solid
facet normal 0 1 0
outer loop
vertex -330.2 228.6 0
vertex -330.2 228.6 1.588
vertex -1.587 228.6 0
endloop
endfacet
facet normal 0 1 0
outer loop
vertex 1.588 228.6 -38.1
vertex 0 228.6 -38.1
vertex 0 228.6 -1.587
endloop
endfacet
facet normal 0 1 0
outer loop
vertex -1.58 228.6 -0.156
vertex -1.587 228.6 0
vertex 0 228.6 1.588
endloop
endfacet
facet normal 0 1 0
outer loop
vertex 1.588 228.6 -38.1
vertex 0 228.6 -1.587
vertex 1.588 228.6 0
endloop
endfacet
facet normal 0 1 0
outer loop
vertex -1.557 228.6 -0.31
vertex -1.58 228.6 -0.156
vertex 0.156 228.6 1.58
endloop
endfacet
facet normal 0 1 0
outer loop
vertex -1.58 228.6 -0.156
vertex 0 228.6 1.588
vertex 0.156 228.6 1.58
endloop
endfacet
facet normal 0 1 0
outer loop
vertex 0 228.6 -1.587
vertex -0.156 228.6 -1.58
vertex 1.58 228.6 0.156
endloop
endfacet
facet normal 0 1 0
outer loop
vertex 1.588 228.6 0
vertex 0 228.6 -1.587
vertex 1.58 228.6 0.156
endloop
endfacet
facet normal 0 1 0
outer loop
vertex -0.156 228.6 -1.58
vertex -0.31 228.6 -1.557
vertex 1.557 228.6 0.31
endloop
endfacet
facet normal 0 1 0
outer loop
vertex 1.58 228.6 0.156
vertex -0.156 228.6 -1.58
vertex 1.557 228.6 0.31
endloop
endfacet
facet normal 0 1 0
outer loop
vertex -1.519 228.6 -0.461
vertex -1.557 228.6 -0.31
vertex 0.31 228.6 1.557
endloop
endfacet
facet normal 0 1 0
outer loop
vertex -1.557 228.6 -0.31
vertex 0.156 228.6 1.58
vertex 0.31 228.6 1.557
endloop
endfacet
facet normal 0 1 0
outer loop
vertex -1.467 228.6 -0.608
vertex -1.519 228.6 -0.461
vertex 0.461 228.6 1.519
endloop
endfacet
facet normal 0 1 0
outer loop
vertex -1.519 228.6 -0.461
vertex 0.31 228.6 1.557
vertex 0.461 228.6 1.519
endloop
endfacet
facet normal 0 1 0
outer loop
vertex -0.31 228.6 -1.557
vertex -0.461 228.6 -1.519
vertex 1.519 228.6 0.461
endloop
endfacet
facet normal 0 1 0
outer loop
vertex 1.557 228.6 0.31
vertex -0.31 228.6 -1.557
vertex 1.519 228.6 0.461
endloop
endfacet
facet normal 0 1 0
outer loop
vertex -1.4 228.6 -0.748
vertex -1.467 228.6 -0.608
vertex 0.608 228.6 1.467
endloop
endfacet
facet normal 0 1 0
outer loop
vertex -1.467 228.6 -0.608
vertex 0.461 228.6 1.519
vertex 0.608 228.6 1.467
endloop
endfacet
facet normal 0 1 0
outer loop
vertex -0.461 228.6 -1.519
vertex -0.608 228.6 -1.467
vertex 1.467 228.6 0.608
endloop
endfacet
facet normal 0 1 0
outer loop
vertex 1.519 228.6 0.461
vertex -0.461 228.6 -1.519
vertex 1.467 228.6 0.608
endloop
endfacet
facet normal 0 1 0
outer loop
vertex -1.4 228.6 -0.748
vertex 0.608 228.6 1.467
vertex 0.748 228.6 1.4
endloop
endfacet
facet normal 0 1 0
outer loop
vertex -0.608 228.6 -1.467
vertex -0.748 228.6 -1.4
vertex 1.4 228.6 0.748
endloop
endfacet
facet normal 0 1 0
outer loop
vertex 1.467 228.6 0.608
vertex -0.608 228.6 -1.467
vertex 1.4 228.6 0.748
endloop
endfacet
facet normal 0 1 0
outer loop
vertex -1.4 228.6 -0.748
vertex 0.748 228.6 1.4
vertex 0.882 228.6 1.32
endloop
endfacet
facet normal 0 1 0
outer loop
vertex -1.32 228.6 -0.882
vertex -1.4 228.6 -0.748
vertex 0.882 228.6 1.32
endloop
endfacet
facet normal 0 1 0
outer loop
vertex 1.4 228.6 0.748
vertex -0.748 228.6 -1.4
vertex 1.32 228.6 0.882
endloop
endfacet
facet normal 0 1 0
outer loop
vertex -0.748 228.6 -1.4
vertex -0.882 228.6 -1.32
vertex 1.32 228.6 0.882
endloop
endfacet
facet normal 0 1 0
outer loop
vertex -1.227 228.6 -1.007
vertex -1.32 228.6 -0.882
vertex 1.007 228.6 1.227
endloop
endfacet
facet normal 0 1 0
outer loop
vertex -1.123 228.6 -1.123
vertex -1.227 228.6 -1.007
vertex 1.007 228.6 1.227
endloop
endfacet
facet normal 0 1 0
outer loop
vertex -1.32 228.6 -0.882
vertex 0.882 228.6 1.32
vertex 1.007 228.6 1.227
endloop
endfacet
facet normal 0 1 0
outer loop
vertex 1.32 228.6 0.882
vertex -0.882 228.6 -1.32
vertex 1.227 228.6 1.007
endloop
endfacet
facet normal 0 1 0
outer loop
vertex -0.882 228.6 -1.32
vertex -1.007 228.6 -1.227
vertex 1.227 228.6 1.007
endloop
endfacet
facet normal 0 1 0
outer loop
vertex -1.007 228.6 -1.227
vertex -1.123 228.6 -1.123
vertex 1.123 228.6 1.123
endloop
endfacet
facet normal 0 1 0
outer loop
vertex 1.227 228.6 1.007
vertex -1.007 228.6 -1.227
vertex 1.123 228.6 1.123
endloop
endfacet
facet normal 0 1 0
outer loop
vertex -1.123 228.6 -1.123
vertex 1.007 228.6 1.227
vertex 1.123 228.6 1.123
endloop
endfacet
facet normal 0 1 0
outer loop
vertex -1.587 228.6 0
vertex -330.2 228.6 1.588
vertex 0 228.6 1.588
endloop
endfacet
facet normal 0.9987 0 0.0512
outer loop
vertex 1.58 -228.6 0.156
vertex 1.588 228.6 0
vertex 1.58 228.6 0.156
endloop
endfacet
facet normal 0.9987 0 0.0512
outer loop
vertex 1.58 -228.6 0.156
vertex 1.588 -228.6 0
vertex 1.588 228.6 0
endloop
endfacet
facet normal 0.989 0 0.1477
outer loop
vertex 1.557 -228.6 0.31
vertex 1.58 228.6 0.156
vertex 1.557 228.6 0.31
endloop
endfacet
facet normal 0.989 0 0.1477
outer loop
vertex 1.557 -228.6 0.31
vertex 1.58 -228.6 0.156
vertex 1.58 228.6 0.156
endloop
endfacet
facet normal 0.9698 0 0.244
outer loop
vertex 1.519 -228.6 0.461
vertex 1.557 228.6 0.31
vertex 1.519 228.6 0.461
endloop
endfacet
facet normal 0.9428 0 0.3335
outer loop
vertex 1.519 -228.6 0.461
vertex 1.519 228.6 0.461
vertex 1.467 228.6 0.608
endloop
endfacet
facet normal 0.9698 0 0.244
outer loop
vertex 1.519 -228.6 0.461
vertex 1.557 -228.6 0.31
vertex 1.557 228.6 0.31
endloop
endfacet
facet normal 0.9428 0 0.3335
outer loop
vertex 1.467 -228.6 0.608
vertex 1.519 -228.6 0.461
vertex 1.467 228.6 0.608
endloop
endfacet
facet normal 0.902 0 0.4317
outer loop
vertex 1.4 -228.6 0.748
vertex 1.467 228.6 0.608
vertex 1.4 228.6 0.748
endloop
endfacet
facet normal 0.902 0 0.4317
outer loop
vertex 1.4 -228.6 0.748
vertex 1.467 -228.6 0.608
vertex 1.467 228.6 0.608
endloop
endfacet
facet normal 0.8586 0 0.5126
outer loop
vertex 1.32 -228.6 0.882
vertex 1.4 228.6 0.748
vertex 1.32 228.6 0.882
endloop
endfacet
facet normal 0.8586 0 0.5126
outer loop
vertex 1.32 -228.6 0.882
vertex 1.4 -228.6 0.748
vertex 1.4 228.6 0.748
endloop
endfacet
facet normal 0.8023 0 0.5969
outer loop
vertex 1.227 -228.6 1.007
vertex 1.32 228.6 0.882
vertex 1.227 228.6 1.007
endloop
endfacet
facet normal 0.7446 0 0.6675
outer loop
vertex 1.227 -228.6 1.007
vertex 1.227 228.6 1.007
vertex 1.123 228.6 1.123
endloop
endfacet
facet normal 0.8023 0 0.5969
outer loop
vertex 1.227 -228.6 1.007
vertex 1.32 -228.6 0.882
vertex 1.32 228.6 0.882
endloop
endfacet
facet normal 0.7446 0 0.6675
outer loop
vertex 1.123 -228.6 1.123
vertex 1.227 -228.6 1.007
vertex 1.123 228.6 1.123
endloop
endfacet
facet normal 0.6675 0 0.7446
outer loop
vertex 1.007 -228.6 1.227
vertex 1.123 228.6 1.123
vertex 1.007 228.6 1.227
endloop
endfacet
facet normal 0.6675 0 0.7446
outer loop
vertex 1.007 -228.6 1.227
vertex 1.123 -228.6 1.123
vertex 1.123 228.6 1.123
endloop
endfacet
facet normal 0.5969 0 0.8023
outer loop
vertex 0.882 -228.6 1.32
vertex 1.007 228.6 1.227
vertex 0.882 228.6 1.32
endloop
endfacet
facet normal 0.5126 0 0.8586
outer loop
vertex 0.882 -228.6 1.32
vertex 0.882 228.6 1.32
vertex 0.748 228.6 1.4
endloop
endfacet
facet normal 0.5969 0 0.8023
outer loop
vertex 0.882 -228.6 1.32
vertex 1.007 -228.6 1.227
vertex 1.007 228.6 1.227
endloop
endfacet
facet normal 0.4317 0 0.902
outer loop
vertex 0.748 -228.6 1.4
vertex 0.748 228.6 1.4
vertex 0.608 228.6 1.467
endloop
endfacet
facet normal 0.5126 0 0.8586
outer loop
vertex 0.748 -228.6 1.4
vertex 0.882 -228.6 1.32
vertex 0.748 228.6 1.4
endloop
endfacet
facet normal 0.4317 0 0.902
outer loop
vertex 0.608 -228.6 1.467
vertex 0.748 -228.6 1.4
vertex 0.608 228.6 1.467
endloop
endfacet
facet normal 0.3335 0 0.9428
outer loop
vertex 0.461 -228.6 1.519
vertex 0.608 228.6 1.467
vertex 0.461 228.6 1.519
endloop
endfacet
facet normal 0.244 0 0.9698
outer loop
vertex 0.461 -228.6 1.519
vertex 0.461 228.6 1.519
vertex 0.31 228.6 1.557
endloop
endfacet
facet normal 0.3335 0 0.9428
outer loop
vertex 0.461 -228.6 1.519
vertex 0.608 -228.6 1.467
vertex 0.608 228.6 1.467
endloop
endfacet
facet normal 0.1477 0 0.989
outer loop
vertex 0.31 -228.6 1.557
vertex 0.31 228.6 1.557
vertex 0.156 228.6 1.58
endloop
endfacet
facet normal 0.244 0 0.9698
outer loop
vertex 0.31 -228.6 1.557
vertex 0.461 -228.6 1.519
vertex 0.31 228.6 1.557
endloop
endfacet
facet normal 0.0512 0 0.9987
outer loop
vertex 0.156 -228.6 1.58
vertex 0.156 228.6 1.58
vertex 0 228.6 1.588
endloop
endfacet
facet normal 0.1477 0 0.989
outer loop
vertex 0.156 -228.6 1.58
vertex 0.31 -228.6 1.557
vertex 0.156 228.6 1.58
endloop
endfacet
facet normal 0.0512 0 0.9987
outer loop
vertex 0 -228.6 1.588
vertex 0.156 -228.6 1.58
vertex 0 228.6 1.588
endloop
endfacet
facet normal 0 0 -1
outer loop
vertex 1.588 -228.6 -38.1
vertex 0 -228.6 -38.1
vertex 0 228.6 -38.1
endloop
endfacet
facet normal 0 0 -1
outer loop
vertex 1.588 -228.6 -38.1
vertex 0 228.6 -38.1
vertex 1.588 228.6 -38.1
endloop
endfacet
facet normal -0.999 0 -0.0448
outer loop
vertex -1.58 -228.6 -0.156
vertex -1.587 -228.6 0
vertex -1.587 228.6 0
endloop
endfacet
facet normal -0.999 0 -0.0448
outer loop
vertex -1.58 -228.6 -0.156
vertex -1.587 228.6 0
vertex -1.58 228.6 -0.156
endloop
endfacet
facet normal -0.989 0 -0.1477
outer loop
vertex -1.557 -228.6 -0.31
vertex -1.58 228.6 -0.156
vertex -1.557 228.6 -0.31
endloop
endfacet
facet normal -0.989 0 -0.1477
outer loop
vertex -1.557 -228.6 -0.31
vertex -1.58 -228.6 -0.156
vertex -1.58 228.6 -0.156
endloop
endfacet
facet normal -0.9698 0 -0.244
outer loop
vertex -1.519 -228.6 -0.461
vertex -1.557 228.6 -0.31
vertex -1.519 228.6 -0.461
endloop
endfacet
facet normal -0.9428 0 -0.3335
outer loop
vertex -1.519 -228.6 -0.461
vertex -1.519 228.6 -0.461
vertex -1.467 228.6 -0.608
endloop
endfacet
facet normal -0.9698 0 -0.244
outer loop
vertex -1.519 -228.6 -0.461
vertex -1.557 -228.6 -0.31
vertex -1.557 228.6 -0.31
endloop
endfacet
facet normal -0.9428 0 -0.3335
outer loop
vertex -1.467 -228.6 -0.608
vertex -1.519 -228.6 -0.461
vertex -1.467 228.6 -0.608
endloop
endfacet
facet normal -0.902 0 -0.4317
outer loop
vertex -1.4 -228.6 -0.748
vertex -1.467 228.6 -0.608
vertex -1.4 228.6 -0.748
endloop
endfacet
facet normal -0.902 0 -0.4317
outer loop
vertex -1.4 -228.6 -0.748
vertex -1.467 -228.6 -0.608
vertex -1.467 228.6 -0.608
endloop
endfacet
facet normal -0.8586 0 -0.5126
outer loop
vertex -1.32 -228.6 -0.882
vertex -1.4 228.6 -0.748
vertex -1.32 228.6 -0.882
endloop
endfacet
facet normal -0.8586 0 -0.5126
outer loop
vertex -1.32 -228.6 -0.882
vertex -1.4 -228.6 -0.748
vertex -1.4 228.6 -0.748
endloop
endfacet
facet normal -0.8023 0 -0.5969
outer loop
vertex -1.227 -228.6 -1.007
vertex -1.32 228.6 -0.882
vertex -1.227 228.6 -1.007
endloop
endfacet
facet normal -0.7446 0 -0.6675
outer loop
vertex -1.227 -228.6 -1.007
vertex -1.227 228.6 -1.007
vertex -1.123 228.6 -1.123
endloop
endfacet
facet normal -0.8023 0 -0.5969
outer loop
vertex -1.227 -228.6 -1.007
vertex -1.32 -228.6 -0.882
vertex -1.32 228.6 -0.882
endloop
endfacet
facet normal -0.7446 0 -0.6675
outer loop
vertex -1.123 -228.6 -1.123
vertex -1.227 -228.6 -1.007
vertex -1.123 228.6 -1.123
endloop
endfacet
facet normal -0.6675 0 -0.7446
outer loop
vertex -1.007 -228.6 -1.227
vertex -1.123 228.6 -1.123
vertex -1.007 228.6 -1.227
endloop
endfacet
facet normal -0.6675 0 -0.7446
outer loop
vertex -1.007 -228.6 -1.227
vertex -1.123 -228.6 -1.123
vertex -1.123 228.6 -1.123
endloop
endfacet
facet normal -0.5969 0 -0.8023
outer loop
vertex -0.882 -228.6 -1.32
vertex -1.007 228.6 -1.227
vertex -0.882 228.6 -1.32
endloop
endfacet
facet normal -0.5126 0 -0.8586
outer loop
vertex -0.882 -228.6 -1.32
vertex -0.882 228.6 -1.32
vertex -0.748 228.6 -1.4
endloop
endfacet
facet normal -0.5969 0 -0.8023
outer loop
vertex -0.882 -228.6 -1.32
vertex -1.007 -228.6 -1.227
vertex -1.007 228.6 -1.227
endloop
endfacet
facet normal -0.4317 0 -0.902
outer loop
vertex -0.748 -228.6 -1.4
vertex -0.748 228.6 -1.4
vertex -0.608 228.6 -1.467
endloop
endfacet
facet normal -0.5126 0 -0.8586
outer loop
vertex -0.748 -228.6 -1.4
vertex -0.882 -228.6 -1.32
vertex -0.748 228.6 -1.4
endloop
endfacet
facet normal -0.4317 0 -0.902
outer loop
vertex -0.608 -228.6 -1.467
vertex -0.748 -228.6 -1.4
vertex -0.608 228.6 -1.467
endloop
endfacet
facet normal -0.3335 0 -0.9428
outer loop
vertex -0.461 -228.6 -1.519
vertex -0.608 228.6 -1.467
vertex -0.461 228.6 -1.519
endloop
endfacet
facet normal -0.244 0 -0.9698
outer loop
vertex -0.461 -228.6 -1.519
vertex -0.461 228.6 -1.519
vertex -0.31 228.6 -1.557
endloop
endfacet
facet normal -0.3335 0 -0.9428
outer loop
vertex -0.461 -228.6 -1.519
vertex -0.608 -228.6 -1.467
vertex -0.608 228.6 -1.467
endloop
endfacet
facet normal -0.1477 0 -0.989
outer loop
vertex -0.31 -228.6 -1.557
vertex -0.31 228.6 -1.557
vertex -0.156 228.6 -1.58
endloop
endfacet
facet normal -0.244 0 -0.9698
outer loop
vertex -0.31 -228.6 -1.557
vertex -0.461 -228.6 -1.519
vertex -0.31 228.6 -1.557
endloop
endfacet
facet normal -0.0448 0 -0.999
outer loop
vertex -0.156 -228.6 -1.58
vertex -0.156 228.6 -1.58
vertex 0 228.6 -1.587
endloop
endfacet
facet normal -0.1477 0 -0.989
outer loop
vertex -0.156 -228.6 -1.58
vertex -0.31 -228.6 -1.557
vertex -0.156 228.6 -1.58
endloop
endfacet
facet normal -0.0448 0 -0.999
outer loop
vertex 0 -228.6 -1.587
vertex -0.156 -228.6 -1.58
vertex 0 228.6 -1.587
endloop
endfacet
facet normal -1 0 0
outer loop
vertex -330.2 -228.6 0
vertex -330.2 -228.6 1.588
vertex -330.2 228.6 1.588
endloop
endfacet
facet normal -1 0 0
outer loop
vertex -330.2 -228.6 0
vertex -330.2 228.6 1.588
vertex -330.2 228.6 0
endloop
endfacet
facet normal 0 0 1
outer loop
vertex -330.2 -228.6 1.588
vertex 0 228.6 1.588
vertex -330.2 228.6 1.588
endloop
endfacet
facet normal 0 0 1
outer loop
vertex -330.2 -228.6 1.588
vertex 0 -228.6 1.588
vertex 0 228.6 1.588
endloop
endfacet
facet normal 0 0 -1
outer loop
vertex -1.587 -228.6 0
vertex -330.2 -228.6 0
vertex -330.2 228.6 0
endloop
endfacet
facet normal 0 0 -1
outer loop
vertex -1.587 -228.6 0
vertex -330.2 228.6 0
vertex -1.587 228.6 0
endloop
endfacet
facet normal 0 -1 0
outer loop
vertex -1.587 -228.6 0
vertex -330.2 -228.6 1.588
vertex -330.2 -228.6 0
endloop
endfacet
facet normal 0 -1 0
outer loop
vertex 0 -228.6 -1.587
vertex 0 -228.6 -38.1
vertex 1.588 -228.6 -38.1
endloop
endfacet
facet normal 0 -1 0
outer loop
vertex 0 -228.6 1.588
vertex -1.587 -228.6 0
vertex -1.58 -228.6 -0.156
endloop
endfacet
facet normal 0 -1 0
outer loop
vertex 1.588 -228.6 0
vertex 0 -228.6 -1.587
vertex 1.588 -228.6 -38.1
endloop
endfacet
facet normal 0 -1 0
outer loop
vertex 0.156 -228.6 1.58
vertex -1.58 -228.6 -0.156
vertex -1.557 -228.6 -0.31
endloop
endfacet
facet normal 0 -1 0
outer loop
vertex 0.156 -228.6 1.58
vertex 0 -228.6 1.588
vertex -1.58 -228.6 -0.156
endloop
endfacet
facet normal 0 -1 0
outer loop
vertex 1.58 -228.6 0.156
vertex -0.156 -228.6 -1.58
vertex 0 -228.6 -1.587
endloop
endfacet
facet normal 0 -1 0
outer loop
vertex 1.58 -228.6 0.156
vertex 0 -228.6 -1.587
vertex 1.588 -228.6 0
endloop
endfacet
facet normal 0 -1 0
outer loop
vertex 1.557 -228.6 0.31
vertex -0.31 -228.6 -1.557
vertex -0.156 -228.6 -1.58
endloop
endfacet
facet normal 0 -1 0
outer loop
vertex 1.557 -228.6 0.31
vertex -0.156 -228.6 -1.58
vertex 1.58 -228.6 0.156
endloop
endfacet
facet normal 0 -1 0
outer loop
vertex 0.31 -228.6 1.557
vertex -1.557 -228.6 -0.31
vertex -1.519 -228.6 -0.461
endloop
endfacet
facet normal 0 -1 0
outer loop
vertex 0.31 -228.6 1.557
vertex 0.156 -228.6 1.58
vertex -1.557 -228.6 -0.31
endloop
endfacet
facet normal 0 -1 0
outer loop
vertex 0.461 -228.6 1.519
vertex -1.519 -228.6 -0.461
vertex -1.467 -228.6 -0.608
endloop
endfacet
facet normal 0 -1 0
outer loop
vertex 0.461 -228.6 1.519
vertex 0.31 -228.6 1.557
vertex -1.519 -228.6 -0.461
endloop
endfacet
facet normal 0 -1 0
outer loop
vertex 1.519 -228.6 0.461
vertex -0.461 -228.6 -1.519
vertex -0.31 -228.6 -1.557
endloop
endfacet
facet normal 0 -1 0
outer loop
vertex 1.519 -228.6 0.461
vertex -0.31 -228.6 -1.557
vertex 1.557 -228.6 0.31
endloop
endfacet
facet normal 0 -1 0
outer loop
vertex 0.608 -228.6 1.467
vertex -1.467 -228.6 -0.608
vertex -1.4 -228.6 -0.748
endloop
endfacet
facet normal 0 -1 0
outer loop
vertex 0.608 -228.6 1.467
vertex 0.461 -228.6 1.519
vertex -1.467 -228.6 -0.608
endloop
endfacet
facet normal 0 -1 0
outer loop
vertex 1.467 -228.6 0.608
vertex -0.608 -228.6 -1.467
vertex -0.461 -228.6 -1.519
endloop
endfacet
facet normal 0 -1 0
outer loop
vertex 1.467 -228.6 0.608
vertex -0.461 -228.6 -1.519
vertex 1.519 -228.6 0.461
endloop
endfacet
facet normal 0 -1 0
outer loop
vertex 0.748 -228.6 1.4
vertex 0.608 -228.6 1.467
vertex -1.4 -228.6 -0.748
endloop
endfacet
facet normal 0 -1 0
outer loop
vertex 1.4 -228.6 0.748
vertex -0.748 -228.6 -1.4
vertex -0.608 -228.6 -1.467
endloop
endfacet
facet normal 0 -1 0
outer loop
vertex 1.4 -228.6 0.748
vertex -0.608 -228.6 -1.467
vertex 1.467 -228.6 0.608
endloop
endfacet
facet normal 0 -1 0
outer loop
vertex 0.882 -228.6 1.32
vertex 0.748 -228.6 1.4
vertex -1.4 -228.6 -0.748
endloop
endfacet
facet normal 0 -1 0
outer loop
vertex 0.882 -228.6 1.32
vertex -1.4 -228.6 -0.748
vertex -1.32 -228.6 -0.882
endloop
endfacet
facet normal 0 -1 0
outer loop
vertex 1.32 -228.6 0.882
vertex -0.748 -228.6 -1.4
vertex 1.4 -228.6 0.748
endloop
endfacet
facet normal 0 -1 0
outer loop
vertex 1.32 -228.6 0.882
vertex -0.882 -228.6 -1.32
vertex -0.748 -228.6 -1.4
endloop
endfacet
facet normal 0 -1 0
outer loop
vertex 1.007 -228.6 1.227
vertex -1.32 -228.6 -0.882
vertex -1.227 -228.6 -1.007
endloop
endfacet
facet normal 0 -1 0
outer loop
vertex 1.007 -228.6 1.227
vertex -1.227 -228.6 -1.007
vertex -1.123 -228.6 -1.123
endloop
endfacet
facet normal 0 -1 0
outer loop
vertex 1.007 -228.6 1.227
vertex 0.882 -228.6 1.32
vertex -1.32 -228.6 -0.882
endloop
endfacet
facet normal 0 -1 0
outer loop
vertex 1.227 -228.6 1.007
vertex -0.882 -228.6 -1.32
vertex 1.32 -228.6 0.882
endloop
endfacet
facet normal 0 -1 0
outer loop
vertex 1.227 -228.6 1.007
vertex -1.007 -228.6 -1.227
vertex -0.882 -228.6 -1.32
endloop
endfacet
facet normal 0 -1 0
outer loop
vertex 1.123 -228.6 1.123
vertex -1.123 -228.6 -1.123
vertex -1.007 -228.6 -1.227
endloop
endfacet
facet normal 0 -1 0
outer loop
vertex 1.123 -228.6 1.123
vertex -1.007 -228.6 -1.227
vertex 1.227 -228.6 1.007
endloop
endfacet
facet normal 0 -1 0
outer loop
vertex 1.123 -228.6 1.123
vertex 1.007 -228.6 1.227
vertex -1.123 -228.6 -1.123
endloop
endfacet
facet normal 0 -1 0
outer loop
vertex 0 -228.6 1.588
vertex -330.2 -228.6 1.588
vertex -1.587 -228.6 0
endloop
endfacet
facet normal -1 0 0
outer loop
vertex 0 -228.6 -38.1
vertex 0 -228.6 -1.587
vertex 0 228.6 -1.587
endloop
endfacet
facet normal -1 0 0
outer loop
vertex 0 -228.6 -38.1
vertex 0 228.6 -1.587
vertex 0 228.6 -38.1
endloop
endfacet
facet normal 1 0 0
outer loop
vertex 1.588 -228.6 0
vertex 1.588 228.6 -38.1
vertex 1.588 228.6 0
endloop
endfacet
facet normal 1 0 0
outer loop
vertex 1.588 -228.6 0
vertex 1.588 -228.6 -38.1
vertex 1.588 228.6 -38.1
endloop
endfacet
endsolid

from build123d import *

# Parameters (mm, degrees)
F1_DEPTH = 228.6


with BuildPart() as f1:
    # F0 (on Front) → F1 (new body, symmetric)
    with BuildSketch(Plane.XZ):
        with BuildLine():
            ThreePointArc((-1.5875, 0), (-1.122532, 1.122532), (0, 1.5875))
            Line((0, 1.5875), (-330.2, 1.5875))
            Line((-330.2, 1.5875), (-330.2, 0))
            Line((-330.2, 0), (-1.5875, 0))
        make_face()
        with BuildLine():
            Line((1.5875, -38.1), (1.5875, 0))
            ThreePointArc((1.5875, 0), (1.122532, -1.122532), (0, -1.5875))
            Line((0, -1.5875), (0, -38.1))
            Line((0, -38.1), (1.5875, -38.1))
        make_face()
        with BuildLine():
            ThreePointArc((0, -1.5875), (1.122532, -1.122532), (1.5875, 0))
            ThreePointArc((1.5875, 0), (1.122532, 1.122532), (0, 1.5875))
            ThreePointArc((0, 1.5875), (-1.122532, 1.122532), (-1.5875, 0))
            ThreePointArc((-1.5875, 0), (-1.122532, -1.122532), (0, -1.5875))
        make_face()
    extrude(amount=F1_DEPTH, both=True)


solid = f1.part
